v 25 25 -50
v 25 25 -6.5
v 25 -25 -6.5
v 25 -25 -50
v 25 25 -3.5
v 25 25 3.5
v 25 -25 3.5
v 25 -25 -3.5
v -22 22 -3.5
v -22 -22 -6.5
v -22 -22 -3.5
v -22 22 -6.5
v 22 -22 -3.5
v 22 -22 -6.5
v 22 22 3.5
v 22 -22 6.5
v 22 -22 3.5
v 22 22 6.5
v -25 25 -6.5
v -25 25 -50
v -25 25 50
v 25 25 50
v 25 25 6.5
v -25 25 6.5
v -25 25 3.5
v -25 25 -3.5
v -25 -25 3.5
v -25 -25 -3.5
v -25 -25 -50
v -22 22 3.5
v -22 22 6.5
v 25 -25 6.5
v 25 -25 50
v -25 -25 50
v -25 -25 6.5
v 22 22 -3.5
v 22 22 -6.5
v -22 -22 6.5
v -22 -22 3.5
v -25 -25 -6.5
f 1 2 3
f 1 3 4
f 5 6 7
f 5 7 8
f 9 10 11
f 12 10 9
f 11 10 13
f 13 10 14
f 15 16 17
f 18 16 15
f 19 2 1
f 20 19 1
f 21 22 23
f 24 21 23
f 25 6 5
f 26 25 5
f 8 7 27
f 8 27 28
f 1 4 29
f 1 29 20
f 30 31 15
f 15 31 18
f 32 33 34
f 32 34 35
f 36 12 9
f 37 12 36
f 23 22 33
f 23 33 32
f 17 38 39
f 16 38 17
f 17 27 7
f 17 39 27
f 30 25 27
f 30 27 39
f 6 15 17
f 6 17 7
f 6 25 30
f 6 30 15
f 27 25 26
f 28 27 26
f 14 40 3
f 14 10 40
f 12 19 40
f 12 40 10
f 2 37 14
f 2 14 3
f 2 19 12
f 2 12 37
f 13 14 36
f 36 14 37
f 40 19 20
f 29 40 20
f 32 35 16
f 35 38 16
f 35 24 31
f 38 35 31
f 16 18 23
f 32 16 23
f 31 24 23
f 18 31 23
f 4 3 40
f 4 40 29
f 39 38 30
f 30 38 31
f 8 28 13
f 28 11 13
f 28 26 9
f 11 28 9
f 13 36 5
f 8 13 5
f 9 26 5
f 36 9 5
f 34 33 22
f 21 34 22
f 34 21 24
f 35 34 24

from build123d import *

# Parameters (mm, degrees)
SKETCH1_W           = 100
SKETCH1_H           = 50
BOSS_EXTRUDE1_DEPTH = 25
SKETCH2_W           = 50
SKETCH2_H           = 50
SKETCH2_W_2         = 44
SKETCH2_H_2         = 44
CUT_EXTRUDE1_DEPTH  = 1.5


with BuildPart() as part:
    # Sketch1 → Boss-Extrude1 (new, symmetric)
    with BuildSketch(Plane(origin=(0, 0, 0), x_dir=(0, 0, -1), z_dir=(1, 0, 0))):
        Rectangle(SKETCH1_W, SKETCH1_H)
    extrude(amount=BOSS_EXTRUDE1_DEPTH, both=True)

    # Sketch2 → Cut-Extrude1 (cut, symmetric)
    with BuildSketch(Plane.XY.offset(5)):
        Rectangle(SKETCH2_W, SKETCH2_H)
        Rectangle(SKETCH2_W_2, SKETCH2_H_2, mode=Mode.SUBTRACT)
    cut_extrude1 = extrude(amount=CUT_EXTRUDE1_DEPTH, both=True, mode=Mode.SUBTRACT)

    # Mirror1: Cut-Extrude1 across plane
    add(cut_extrude1.mirror(Plane.XY), mode=Mode.SUBTRACT)


solid = part.part
